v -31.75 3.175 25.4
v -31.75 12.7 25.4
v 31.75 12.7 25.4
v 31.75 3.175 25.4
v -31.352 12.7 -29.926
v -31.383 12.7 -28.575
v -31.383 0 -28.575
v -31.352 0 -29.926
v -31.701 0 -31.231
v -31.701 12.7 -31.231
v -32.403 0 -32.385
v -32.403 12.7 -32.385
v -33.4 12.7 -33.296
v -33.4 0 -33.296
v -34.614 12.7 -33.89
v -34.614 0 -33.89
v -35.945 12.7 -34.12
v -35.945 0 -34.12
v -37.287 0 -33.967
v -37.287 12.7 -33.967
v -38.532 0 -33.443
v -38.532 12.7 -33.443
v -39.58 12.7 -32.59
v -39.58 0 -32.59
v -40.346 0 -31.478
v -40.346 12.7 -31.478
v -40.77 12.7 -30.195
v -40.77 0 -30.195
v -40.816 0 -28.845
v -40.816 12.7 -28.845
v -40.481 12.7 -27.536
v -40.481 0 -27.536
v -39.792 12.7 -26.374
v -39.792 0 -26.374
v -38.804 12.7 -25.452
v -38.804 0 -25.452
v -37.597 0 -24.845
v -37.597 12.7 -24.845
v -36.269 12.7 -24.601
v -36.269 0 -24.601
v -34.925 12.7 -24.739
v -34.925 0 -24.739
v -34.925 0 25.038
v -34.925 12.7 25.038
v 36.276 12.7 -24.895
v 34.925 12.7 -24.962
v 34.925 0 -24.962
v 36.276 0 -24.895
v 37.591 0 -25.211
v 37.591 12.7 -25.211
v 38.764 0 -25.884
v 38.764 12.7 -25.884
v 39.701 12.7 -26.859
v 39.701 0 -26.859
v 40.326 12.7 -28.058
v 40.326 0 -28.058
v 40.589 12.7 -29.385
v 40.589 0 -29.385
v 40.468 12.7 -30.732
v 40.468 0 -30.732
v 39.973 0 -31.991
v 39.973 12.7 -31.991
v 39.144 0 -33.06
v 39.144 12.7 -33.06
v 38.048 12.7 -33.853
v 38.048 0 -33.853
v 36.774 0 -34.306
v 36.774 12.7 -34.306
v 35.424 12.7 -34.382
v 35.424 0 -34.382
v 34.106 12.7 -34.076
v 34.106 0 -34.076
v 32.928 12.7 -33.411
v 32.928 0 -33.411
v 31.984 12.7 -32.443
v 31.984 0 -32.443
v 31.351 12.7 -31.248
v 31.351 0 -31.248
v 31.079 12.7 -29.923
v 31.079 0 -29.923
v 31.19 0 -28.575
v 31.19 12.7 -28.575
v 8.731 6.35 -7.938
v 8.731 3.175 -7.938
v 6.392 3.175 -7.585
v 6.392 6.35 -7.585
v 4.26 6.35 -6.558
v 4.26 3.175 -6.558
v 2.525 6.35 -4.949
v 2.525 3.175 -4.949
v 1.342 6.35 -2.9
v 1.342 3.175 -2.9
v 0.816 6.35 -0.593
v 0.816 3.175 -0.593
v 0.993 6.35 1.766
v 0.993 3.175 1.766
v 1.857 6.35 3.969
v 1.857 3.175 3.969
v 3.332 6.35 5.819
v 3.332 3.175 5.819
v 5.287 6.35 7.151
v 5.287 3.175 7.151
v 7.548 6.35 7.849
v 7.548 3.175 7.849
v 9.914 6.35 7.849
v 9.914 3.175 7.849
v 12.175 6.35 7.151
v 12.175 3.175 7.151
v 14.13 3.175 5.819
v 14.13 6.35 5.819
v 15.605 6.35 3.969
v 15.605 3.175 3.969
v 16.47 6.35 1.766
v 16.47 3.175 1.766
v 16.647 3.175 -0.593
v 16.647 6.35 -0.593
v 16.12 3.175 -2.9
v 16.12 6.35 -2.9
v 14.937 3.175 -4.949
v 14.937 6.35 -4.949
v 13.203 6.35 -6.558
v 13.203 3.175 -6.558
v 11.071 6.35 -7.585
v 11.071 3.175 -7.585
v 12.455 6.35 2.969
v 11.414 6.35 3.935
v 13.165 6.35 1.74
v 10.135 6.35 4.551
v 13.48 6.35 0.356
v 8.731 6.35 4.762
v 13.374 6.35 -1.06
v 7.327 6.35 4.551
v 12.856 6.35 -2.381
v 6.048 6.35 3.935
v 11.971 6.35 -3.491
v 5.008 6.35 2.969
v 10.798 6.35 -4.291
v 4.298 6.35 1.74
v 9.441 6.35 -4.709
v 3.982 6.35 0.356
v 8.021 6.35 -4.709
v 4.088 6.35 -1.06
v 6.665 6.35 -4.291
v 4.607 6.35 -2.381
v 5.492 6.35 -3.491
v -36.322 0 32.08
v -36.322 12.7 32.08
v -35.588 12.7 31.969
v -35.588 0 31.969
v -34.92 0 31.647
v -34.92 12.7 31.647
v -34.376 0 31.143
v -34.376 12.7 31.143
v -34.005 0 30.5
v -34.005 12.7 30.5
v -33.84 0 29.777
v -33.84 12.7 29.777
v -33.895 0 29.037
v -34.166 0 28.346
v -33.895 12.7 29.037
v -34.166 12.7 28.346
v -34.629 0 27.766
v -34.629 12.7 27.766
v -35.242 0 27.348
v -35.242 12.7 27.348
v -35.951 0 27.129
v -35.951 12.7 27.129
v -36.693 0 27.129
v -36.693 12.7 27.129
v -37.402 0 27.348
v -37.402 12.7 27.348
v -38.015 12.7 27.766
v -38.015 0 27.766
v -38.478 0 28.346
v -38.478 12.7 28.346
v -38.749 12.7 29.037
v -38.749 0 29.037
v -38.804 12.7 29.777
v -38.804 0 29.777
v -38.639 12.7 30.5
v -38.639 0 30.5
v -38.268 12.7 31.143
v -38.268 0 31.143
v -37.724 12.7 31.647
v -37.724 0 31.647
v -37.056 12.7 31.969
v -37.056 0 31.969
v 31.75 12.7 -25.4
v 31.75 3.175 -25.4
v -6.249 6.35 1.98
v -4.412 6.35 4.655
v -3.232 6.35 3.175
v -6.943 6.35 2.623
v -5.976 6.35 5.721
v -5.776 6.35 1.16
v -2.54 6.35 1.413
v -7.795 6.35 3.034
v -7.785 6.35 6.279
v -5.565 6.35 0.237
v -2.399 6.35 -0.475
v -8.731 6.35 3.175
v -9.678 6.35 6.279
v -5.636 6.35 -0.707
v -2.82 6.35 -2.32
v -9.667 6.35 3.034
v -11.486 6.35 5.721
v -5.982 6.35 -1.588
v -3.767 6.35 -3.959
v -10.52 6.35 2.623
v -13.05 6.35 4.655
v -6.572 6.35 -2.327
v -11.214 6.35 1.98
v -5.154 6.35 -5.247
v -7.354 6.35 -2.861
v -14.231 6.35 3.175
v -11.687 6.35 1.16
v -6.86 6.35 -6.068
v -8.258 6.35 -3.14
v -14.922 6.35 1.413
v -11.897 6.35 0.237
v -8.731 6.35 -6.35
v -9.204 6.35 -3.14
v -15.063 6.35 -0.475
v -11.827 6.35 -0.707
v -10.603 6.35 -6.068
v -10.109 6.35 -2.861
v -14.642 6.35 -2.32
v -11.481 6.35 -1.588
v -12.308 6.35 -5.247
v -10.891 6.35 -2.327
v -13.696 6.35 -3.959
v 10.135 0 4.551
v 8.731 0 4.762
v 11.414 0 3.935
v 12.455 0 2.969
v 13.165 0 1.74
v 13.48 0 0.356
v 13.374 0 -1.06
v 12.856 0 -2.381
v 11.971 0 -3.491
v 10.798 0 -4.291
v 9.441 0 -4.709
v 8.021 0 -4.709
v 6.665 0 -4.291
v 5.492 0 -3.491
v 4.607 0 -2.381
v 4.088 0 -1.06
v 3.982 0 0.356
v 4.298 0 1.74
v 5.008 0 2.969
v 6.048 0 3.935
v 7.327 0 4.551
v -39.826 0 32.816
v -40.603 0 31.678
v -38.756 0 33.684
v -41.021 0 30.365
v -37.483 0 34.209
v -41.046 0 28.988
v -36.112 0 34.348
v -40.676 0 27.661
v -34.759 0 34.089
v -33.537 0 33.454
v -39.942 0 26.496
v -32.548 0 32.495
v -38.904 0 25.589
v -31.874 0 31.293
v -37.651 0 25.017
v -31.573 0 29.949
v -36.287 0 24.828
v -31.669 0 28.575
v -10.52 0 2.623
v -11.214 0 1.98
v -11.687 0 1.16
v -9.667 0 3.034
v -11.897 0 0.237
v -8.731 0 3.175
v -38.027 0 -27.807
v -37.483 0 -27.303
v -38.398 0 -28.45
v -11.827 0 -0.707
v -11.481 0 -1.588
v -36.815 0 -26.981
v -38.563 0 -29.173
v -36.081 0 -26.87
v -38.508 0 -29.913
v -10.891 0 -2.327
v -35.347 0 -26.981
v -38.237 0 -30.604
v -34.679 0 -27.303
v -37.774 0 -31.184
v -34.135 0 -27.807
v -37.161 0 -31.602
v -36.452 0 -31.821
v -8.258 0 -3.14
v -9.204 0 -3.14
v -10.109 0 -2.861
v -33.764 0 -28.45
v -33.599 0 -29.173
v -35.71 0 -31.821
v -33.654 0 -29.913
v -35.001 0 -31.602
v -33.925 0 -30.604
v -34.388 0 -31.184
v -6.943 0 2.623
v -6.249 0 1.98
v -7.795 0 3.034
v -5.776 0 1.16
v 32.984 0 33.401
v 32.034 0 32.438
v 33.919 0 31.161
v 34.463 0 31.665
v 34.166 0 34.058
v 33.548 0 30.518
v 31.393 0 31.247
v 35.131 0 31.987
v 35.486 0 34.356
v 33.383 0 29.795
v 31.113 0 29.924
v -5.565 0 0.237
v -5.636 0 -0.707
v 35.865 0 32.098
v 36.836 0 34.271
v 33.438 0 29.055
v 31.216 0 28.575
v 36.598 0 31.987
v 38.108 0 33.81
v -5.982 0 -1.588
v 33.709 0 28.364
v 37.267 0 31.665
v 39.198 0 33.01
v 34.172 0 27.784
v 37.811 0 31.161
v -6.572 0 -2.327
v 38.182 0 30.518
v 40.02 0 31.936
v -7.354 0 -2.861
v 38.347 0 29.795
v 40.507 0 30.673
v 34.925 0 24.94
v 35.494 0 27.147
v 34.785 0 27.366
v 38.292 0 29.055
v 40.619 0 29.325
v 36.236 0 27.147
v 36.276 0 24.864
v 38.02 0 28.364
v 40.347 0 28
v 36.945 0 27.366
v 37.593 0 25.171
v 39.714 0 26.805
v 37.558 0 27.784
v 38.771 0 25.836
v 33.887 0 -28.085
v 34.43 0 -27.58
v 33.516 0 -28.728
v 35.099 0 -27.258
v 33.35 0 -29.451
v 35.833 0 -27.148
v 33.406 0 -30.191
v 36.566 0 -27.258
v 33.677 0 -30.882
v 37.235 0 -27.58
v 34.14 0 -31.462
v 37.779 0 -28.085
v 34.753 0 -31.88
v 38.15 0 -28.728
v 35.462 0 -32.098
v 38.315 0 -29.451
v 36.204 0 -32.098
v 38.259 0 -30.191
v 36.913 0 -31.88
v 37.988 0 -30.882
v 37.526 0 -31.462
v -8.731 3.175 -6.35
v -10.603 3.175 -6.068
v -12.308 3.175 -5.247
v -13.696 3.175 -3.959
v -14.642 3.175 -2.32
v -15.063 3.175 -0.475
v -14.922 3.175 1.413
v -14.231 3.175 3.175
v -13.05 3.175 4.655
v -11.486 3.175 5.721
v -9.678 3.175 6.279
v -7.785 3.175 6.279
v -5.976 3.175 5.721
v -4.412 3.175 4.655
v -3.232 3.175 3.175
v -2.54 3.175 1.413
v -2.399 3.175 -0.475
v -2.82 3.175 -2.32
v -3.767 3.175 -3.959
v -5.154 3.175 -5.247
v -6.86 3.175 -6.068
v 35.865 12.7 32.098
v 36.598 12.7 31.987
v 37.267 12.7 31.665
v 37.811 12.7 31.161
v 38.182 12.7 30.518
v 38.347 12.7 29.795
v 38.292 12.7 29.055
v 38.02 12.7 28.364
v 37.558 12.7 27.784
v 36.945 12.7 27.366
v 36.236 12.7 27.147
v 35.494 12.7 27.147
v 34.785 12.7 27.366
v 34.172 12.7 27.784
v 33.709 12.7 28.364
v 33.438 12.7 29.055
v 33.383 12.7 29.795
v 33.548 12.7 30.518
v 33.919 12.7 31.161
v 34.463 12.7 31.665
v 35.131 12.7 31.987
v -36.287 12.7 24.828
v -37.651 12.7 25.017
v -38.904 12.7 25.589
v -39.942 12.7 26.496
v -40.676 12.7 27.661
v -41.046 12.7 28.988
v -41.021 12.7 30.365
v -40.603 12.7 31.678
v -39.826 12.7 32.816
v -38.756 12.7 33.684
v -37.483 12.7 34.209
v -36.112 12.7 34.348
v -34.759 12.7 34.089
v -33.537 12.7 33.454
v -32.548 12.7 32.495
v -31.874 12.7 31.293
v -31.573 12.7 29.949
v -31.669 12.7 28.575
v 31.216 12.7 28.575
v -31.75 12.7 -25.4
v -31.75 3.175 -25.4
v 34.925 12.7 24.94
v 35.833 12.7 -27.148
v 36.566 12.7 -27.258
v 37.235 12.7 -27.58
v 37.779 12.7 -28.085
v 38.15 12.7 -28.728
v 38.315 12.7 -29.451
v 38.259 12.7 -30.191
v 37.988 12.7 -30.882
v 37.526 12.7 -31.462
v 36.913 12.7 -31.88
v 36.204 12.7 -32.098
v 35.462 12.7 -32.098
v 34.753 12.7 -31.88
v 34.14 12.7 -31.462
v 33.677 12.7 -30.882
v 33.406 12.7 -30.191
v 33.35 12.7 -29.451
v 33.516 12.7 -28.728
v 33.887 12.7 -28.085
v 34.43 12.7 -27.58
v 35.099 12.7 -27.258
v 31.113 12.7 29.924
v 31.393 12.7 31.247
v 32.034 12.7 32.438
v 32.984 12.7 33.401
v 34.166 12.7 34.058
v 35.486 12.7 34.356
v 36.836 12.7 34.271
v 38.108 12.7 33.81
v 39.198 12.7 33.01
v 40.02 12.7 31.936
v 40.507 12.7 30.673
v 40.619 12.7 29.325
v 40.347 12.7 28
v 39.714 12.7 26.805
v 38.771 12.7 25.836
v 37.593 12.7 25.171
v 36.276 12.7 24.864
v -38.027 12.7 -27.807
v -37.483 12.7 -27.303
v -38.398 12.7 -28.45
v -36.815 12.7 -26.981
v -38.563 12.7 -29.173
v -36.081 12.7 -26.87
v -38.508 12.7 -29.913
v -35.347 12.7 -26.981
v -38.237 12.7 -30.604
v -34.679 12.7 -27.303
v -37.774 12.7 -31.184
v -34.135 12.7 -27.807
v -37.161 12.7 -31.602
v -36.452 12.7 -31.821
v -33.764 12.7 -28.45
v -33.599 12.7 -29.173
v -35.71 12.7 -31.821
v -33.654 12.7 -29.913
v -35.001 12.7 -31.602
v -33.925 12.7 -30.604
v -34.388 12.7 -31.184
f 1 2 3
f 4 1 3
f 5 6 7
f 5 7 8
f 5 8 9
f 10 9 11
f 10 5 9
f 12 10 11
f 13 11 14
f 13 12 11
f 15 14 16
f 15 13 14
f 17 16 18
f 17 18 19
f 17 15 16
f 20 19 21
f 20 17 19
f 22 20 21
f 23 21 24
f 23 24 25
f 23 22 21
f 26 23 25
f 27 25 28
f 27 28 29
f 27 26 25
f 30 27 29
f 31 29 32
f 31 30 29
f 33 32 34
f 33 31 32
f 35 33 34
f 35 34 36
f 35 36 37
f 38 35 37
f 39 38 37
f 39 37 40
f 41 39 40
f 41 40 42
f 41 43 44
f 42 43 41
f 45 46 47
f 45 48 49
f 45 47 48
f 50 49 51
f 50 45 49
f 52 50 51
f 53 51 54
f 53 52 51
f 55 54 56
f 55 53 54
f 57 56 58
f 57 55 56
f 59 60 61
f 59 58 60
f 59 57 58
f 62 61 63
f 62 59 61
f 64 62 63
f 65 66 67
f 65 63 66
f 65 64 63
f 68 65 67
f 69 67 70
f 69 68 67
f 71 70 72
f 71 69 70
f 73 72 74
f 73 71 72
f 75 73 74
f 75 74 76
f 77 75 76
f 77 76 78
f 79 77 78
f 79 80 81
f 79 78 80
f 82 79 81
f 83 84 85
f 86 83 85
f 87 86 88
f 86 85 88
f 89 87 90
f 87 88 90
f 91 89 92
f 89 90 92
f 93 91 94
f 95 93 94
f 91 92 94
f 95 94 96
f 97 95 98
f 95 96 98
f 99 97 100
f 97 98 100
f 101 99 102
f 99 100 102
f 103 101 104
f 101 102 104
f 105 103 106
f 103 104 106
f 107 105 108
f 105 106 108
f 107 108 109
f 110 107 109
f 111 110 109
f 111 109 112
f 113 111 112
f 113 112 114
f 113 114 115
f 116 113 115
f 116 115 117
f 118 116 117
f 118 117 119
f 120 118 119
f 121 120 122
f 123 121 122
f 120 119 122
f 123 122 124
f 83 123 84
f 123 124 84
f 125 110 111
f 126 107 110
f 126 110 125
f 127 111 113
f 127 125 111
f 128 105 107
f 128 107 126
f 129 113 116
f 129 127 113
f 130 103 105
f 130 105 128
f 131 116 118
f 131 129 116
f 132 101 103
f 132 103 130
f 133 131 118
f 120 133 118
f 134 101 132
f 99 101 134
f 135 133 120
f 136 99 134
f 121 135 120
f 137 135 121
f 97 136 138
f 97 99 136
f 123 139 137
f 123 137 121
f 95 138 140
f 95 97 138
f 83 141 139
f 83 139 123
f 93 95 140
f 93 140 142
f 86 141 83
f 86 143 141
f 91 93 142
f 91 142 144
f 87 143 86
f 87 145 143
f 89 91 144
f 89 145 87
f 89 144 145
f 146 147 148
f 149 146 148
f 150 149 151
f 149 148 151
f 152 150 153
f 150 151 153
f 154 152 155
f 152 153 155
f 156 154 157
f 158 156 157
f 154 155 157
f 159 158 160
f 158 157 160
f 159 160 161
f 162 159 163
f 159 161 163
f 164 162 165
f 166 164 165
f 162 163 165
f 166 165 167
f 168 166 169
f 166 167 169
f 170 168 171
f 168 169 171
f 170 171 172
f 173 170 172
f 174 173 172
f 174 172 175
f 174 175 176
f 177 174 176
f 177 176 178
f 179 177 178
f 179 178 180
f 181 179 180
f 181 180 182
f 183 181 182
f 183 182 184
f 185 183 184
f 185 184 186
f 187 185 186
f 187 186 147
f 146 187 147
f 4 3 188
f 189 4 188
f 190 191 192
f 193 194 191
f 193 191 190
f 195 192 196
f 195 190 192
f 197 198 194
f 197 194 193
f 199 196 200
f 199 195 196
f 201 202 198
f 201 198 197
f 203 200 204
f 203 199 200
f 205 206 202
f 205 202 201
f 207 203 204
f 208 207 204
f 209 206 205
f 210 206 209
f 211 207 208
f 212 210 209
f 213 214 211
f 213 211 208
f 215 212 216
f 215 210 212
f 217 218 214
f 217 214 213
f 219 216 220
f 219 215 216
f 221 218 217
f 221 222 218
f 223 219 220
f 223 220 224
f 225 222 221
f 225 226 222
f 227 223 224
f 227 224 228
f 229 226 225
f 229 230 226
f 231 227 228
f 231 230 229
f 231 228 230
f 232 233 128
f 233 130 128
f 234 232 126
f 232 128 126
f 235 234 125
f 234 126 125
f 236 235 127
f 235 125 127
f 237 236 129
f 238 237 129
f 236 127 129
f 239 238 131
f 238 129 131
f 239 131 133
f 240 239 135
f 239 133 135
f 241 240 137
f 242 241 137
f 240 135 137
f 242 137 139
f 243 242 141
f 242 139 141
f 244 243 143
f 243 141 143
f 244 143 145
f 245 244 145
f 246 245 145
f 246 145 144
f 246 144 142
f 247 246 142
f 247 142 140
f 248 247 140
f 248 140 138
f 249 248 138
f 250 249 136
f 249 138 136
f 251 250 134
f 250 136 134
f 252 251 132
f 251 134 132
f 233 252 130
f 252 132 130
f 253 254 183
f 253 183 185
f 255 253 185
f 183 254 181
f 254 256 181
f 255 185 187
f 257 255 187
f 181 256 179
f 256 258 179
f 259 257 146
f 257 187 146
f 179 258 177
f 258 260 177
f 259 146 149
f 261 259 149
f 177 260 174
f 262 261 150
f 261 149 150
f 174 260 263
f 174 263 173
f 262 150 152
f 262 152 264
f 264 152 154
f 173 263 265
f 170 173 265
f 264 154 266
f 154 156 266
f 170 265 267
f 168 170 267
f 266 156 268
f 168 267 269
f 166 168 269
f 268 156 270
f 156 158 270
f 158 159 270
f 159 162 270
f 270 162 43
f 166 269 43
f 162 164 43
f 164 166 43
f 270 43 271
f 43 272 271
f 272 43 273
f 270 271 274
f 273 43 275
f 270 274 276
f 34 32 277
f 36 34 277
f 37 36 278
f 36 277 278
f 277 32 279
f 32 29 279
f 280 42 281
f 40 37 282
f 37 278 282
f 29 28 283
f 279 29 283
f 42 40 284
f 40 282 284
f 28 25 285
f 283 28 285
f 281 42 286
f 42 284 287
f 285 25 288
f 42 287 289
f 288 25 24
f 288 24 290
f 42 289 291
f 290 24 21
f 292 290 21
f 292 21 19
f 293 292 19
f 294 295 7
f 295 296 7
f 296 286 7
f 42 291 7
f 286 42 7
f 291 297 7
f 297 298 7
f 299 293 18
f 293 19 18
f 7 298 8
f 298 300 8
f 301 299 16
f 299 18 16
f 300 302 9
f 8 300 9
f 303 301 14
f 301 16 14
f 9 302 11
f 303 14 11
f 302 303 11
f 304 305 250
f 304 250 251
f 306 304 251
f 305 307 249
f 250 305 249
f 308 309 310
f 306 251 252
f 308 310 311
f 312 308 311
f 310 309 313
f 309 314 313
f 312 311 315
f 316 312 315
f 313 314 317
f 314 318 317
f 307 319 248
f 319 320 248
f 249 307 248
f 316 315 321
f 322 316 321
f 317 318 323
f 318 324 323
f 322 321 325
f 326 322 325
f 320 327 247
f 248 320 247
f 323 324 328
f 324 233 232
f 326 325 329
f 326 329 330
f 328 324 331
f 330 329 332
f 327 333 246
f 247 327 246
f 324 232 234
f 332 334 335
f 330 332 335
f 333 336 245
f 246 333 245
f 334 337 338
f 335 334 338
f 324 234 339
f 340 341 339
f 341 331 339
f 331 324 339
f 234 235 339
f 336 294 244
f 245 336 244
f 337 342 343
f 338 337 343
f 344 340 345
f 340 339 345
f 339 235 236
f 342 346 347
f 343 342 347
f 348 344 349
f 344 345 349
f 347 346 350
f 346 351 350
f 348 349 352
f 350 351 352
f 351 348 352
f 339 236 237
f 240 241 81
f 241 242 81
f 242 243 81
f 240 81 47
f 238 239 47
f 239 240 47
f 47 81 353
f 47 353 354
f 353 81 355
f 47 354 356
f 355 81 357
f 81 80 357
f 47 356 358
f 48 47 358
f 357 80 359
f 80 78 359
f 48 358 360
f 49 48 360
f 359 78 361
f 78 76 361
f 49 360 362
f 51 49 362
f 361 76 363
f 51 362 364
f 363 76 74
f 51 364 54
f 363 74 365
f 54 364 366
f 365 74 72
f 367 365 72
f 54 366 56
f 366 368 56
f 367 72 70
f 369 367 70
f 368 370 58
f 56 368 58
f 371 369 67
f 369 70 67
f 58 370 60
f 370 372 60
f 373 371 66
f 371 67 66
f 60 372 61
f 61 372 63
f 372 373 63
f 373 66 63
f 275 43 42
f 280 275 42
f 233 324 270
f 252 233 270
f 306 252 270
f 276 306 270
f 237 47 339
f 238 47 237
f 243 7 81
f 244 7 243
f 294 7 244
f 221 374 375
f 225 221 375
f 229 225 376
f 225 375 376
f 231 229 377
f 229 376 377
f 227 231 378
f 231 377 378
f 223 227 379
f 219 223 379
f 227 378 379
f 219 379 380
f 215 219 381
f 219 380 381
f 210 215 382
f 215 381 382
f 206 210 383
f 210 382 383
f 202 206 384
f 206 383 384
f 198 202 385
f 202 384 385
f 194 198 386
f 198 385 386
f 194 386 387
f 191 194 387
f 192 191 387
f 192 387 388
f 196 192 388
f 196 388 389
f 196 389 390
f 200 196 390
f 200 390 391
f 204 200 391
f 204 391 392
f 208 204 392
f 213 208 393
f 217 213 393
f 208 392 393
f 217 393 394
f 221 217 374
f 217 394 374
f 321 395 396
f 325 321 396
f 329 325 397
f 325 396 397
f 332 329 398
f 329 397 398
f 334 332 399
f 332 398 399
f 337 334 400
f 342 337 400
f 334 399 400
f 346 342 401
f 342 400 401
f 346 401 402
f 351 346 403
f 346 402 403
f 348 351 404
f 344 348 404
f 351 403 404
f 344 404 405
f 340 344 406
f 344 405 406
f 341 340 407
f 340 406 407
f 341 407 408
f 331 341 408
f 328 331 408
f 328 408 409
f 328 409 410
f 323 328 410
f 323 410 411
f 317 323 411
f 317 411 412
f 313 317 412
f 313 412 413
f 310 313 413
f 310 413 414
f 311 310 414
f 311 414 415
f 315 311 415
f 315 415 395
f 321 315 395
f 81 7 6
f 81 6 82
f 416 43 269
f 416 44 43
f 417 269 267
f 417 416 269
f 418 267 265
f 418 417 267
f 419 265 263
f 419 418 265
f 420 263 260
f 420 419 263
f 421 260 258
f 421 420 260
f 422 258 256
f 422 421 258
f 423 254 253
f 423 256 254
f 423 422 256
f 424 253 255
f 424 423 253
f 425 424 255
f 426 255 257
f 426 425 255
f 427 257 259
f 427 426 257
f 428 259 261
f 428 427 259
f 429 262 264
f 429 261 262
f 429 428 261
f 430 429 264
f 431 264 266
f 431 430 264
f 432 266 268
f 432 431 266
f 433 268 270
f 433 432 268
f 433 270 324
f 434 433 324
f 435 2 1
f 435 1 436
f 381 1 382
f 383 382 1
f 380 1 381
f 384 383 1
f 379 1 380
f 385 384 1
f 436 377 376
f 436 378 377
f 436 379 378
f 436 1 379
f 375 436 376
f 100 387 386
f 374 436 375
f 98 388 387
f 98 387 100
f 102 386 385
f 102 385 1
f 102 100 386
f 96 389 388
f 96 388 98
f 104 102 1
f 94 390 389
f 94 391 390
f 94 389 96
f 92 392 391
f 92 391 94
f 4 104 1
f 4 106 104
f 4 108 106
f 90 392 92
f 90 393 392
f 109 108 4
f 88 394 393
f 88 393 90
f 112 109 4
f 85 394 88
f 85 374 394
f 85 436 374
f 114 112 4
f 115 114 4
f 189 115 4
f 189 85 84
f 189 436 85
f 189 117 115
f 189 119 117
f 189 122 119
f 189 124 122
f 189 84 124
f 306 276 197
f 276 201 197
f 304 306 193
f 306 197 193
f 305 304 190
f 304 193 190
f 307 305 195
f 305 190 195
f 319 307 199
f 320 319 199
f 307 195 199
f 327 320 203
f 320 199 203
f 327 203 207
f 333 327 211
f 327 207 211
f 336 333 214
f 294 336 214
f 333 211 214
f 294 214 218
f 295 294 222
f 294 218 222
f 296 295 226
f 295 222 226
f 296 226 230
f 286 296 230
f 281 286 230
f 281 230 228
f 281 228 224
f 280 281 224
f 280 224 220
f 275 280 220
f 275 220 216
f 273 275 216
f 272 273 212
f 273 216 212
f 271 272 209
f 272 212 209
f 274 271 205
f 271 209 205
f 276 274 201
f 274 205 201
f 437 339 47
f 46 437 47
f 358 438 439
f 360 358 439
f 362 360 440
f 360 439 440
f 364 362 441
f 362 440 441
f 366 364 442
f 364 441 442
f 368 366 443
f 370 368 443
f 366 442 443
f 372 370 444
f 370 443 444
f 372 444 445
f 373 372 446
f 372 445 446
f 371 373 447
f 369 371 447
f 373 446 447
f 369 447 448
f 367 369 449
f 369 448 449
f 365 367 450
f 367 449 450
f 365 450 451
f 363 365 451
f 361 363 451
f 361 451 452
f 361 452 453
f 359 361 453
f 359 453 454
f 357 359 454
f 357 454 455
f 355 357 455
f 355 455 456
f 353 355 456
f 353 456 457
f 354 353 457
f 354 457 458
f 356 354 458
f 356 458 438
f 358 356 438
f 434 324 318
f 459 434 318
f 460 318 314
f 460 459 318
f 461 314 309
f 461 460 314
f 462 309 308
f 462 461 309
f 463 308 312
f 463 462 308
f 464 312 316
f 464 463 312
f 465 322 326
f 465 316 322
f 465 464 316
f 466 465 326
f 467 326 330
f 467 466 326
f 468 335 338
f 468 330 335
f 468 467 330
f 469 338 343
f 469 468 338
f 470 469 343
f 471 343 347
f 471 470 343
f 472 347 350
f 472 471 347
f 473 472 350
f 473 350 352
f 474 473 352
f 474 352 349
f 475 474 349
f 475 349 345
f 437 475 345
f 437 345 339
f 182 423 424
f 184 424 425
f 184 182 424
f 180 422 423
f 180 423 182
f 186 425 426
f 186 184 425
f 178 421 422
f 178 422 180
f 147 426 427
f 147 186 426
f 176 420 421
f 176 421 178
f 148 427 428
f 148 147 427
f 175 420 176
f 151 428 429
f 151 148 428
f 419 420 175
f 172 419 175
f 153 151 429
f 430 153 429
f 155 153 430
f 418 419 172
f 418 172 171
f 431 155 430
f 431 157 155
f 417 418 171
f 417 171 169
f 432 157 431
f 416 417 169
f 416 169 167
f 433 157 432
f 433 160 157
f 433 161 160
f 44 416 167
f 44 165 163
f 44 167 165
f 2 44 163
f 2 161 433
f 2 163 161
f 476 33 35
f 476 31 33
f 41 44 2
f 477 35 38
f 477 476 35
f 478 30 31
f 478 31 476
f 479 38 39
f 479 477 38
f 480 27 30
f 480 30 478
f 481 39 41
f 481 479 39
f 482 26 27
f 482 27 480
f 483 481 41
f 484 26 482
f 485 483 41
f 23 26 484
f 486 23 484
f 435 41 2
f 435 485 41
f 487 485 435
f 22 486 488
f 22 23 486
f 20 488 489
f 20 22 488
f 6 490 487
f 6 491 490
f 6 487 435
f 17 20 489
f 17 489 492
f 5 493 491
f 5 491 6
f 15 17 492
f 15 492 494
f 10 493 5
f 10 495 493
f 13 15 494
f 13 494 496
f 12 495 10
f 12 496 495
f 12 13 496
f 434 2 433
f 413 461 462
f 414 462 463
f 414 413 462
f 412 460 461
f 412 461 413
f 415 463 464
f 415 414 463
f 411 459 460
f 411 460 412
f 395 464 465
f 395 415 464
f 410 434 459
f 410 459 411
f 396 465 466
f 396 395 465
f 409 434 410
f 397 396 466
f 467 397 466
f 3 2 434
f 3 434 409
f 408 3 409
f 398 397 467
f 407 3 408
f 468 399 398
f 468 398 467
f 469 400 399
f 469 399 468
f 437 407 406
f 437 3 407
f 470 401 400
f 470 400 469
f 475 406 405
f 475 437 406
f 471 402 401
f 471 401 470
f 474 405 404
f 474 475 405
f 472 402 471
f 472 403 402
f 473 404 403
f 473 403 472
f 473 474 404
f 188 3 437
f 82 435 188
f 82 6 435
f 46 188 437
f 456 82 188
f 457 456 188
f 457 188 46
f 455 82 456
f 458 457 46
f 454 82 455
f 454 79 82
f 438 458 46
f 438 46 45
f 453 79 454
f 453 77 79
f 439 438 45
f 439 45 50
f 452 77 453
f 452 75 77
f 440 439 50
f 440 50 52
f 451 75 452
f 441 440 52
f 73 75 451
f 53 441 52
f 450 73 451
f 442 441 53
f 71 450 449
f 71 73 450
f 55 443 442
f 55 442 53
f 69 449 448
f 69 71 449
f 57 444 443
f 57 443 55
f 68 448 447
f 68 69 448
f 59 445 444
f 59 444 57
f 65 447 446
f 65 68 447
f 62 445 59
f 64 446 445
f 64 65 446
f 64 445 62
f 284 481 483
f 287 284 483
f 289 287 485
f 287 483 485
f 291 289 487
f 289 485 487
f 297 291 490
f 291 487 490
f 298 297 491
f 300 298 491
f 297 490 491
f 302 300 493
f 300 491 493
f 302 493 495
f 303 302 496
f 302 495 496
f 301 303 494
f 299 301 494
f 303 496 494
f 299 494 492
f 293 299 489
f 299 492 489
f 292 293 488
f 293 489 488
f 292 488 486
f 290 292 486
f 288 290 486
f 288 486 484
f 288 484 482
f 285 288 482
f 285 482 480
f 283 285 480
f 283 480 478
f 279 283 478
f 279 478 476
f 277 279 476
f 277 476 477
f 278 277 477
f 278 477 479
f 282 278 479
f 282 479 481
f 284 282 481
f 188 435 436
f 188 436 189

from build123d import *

# Parameters (mm, degrees)
SKETCH1_W           = 69.85
SKETCH1_H           = 57.15
BOSS_EXTRUDE1_DEPTH = 12.7
SKETCH2_W           = 63.5
SKETCH2_H           = 50.8
CUT_EXTRUDE1_DEPTH  = 9.525
SKETCH3_R           = 6.35
SKETCH3_R_2         = 3.175
SKETCH3_R_3         = 7.9375
SKETCH3_R_4         = 4.7625
BOSS_EXTRUDE2_DEPTH = 3.175
SKETCH5_R           = 3.175
CUT_EXTRUDE2_DEPTH  = 46.5698228
SKETCH6_R           = 4.7625
CUT_EXTRUDE3_DEPTH  = 46.5698228
SKETCH8_R           = 4.7625
BOSS_EXTRUDE3_DEPTH = 12.7
SKETCH9_R           = 2.4892
CUT_EXTRUDE4_DEPTH  = 56.068582541


with BuildPart() as part:
    # Sketch1 → Boss-Extrude1 (new body)
    with BuildSketch(Plane(origin=(0, 0, 0), x_dir=(1, 0, 0), z_dir=(0, 1, 0))):
        Rectangle(SKETCH1_W, SKETCH1_H)
    extrude(amount=BOSS_EXTRUDE1_DEPTH)

    # Sketch2 → Cut-Extrude1 (cut)
    with BuildSketch(Plane(origin=(0, 12.7, 0), x_dir=(1, 0, 0), z_dir=(0, 1, 0))):
        Rectangle(SKETCH2_W, SKETCH2_H)
    extrude(amount=-CUT_EXTRUDE1_DEPTH, mode=Mode.SUBTRACT)

    # Sketch3 → Boss-Extrude2 (add)
    # profile 1 of 2: a face of its own
    with BuildSketch(Plane(origin=(0, 3.175, 0), x_dir=(1, 0, 0), z_dir=(0, 1, 0))):
        with Locations(Location((-8.73125, 0, 0), (0, 0, 90))):
            Circle(SKETCH3_R)
        with Locations(Location((-8.73125, 0, 0), (0, 0, 270))):
            Circle(SKETCH3_R_2, mode=Mode.SUBTRACT)
    # profile 2 of 2: a face of its own
    with BuildSketch(Plane(origin=(0, 3.175, 0), x_dir=(1, 0, 0), z_dir=(0, 1, 0))):
        with Locations(Location((8.73125, 0, 0), (0, 0, 90))):
            Circle(SKETCH3_R_3)
        with Locations(Location((8.73125, 0, 0), (0, 0, 270))):
            Circle(SKETCH3_R_4, mode=Mode.SUBTRACT)
    extrude(amount=BOSS_EXTRUDE2_DEPTH)

    # Sketch5 → Cut-Extrude2 (cut, through all)
    with BuildSketch(Plane(origin=(0, 6.35, 0), x_dir=(1, 0, 0), z_dir=(0, 1, 0))):
        with Locations(Location((-8.73125, 0, 0), (0, 0, 270))):
            Circle(SKETCH5_R)
    extrude(amount=-CUT_EXTRUDE2_DEPTH, mode=Mode.SUBTRACT)

    # Sketch6 → Cut-Extrude3 (cut, through all)
    with BuildSketch(Plane(origin=(0, 6.35, 0), x_dir=(1, 0, 0), z_dir=(0, 1, 0))):
        with Locations(Location((8.73125, 0, 0), (0, 0, 270))):
            Circle(SKETCH6_R)
    extrude(amount=-CUT_EXTRUDE3_DEPTH, mode=Mode.SUBTRACT)

    # Sketch8 → Boss-Extrude3 (add)
    with BuildSketch(Plane(origin=(0, 12.7, 0), x_dir=(1, 0, 0), z_dir=(0, 1, 0))):
        with Locations((-36.080944449, 29.359475258)):
            Circle(SKETCH8_R)
        with Locations((35.832665303, 29.636957013)):
            Circle(SKETCH8_R)
        with Locations((35.864779118, -29.608646076)):
            Circle(SKETCH8_R)
        with Locations((-36.322, -29.590559194)):
            Circle(SKETCH8_R)
    extrude(amount=-BOSS_EXTRUDE3_DEPTH)

    # Sketch9 → Cut-Extrude4 (cut, through all)
    with BuildSketch(Plane(origin=(0, 12.7, 0), x_dir=(1, 0, 0), z_dir=(0, 1, 0))):
        with Locations(Location((-36.080944449, 29.359475258, 0), (0, 0, 270))):
            Circle(SKETCH9_R)
        with Locations(Location((-36.322, -29.590559194, 0), (0, 0, 270))):
            Circle(SKETCH9_R)
        with Locations(Location((35.864779118, -29.608646076, 0), (0, 0, 270))):
            Circle(SKETCH9_R)
        with Locations(Location((35.832665303, 29.636957013, 0), (0, 0, 270))):
            Circle(SKETCH9_R)
    extrude(amount=-CUT_EXTRUDE4_DEPTH, mode=Mode.SUBTRACT)


solid = part.part
